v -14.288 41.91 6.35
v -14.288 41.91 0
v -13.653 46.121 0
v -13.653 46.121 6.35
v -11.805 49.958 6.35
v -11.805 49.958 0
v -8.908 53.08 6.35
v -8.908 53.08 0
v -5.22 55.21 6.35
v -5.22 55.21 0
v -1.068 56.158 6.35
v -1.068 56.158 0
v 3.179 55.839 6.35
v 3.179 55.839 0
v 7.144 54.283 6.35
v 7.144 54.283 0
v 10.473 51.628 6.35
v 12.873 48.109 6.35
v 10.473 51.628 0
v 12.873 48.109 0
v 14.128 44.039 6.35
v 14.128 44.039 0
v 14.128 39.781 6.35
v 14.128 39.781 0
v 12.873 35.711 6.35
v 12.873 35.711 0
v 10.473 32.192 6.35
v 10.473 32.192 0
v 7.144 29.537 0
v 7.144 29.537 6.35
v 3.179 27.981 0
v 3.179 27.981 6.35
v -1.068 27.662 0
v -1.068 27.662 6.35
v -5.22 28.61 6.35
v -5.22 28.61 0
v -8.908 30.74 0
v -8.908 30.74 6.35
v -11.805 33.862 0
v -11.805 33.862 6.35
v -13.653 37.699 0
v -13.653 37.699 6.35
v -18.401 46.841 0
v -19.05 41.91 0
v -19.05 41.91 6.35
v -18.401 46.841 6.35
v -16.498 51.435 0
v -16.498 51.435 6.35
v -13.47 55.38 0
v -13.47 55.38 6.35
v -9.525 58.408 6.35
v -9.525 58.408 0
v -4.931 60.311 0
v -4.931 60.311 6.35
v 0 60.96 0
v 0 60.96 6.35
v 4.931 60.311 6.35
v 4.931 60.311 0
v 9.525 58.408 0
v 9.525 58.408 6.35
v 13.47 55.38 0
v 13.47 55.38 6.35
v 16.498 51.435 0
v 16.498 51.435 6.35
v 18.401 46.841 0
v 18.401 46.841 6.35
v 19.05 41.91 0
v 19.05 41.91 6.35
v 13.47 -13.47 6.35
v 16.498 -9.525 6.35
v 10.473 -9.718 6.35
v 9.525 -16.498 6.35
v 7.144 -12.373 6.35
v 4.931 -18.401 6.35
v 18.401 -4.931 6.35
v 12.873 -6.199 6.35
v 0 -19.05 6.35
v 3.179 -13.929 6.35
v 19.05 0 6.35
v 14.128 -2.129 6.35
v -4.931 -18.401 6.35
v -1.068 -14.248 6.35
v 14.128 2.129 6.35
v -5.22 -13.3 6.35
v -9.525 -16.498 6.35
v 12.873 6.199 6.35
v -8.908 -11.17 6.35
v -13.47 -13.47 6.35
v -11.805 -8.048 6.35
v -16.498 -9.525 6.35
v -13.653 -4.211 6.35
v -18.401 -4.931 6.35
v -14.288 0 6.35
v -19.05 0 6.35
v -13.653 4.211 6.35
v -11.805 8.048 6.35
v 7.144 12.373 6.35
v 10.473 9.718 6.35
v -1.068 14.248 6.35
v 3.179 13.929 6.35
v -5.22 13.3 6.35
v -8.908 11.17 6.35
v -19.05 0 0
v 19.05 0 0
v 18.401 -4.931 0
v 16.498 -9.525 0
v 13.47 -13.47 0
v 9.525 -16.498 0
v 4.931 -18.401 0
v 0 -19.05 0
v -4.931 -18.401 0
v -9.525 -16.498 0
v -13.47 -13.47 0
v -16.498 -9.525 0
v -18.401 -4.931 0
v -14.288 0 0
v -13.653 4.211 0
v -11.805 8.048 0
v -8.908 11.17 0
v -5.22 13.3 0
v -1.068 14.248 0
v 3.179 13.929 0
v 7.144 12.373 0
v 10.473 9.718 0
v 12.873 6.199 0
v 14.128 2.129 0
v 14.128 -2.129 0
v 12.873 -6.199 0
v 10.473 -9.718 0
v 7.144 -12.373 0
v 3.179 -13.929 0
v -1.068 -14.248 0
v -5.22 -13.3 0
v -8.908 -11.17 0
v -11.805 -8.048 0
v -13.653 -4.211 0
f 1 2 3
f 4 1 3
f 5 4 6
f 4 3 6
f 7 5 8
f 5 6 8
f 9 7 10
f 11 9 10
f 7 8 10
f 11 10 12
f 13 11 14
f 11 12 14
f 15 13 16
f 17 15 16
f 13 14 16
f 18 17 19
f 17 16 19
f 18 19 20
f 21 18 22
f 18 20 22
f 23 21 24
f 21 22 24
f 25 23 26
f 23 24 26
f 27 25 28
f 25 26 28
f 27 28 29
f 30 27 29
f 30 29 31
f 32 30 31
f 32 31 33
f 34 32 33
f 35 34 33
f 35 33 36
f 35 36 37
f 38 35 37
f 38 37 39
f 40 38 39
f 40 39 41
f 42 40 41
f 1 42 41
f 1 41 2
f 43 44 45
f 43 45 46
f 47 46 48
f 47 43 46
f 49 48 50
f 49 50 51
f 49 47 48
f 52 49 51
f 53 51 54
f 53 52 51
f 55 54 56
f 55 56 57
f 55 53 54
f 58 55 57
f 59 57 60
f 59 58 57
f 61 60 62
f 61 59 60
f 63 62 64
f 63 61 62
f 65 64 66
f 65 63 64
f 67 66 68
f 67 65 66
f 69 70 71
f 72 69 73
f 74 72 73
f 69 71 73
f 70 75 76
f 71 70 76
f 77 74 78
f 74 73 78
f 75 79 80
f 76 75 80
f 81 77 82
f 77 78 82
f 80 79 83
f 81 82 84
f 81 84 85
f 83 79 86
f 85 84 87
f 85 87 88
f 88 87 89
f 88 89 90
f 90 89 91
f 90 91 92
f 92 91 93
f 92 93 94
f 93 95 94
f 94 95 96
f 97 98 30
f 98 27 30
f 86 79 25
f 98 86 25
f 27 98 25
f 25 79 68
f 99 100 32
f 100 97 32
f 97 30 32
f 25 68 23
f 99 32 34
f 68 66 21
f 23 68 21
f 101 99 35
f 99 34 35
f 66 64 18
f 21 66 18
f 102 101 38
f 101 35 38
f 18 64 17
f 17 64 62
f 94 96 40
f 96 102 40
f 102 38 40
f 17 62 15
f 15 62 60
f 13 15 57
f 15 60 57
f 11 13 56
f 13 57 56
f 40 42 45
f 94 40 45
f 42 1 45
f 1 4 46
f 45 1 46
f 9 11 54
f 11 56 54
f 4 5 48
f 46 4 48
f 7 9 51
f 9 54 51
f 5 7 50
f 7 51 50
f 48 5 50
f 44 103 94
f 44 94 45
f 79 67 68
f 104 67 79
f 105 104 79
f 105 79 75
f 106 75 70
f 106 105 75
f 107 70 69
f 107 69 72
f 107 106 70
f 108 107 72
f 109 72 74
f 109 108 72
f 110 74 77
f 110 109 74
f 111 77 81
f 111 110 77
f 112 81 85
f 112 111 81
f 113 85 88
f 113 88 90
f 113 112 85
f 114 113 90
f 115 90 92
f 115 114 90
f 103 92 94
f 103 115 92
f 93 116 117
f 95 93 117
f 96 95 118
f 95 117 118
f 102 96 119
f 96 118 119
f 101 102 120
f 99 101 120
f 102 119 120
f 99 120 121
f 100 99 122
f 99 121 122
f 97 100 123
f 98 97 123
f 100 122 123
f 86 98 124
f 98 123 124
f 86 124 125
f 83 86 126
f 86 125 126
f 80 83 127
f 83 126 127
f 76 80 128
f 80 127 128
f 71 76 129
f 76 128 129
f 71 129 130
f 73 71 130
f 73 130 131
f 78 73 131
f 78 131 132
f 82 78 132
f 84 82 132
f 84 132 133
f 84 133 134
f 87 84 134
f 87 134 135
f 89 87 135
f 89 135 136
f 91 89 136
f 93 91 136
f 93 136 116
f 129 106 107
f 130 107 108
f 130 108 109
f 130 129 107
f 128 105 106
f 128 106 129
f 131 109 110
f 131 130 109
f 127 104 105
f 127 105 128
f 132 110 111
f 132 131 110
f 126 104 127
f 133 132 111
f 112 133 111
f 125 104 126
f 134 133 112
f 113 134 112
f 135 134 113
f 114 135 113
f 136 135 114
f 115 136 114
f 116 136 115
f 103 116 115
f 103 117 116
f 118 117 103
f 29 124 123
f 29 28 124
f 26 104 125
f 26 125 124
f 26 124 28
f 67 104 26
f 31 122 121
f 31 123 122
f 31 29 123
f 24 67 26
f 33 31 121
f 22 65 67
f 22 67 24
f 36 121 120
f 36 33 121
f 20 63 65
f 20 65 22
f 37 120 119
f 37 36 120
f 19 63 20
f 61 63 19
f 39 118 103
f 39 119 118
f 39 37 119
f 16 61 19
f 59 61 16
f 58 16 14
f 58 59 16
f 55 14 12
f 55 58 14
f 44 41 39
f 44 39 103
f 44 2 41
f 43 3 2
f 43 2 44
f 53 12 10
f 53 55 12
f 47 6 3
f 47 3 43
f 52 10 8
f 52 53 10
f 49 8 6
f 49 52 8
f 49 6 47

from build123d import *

# Parameters (mm, degrees)
BOSS_EXTRUDE1_DEPTH        = 6.35
F_1_1_DIAMETER_HOLE1_D     = 28.575
F_1_1_DIAMETER_HOLE1_DEPTH = 25.4
F_1_1_DIAMETER_HOLE1_TIP   = 8.584796094


with BuildPart() as part:
    # Sketch1 → Boss-Extrude1 (new body)
    with BuildSketch(Plane.XY):
        with BuildLine():
            Line((-19.05, 0), (-19.05, 41.91))
            ThreePointArc((-19.05, 41.91), (0, 60.96), (19.05, 41.91))
            Line((19.05, 41.91), (19.05, 0))
            ThreePointArc((19.05, 0), (0, -19.05), (-19.05, 0))
        make_face()
    extrude(amount=BOSS_EXTRUDE1_DEPTH)

    # 1 (1) Diameter Hole1
    with Locations(Plane.XY.offset(6.35)):
        with Locations((0, 41.91), (0, 0)):
            Hole(F_1_1_DIAMETER_HOLE1_D / 2, depth=F_1_1_DIAMETER_HOLE1_DEPTH)
            with Locations((0, 0, -(F_1_1_DIAMETER_HOLE1_DEPTH + F_1_1_DIAMETER_HOLE1_TIP / 2))):  # 118° drill point
                Cone(0, F_1_1_DIAMETER_HOLE1_D / 2, F_1_1_DIAMETER_HOLE1_TIP, mode=Mode.SUBTRACT)


solid = part.part
